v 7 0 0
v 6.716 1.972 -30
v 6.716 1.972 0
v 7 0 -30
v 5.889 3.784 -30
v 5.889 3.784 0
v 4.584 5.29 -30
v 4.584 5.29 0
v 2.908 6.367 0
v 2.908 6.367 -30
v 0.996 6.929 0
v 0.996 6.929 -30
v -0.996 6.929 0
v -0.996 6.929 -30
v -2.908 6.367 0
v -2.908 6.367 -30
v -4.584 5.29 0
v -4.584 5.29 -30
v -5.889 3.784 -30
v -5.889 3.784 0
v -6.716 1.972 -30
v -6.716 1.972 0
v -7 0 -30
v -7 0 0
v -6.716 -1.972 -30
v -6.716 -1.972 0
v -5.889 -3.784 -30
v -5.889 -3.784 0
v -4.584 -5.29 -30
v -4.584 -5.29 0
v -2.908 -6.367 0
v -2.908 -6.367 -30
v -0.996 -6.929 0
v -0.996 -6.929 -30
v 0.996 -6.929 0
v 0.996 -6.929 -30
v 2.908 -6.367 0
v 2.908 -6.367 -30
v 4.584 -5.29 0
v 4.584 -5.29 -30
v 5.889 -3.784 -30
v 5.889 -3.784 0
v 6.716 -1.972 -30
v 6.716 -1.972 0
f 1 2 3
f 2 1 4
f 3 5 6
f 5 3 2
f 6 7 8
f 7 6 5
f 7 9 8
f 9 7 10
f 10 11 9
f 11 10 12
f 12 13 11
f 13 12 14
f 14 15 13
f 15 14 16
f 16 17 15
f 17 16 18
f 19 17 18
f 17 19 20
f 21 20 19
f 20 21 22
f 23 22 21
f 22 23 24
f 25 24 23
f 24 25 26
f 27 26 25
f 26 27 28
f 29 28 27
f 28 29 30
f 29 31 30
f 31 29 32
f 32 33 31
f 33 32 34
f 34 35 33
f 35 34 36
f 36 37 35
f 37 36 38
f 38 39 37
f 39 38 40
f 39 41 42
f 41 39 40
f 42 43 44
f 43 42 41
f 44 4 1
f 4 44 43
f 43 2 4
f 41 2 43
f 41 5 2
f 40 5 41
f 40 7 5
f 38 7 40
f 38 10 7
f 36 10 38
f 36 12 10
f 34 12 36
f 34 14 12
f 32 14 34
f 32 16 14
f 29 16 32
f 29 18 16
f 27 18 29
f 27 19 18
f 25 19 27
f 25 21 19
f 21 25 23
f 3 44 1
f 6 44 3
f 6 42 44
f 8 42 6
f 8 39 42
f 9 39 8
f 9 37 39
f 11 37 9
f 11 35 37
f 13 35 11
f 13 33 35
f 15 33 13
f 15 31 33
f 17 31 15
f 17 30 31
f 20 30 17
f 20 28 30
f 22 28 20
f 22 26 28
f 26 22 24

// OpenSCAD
module pied_rond_long()
{
	translate([0,0,-15])
cylinder(h = 30, r1 = 7, r2 = 7, center = true);

}
pied_rond_long();
